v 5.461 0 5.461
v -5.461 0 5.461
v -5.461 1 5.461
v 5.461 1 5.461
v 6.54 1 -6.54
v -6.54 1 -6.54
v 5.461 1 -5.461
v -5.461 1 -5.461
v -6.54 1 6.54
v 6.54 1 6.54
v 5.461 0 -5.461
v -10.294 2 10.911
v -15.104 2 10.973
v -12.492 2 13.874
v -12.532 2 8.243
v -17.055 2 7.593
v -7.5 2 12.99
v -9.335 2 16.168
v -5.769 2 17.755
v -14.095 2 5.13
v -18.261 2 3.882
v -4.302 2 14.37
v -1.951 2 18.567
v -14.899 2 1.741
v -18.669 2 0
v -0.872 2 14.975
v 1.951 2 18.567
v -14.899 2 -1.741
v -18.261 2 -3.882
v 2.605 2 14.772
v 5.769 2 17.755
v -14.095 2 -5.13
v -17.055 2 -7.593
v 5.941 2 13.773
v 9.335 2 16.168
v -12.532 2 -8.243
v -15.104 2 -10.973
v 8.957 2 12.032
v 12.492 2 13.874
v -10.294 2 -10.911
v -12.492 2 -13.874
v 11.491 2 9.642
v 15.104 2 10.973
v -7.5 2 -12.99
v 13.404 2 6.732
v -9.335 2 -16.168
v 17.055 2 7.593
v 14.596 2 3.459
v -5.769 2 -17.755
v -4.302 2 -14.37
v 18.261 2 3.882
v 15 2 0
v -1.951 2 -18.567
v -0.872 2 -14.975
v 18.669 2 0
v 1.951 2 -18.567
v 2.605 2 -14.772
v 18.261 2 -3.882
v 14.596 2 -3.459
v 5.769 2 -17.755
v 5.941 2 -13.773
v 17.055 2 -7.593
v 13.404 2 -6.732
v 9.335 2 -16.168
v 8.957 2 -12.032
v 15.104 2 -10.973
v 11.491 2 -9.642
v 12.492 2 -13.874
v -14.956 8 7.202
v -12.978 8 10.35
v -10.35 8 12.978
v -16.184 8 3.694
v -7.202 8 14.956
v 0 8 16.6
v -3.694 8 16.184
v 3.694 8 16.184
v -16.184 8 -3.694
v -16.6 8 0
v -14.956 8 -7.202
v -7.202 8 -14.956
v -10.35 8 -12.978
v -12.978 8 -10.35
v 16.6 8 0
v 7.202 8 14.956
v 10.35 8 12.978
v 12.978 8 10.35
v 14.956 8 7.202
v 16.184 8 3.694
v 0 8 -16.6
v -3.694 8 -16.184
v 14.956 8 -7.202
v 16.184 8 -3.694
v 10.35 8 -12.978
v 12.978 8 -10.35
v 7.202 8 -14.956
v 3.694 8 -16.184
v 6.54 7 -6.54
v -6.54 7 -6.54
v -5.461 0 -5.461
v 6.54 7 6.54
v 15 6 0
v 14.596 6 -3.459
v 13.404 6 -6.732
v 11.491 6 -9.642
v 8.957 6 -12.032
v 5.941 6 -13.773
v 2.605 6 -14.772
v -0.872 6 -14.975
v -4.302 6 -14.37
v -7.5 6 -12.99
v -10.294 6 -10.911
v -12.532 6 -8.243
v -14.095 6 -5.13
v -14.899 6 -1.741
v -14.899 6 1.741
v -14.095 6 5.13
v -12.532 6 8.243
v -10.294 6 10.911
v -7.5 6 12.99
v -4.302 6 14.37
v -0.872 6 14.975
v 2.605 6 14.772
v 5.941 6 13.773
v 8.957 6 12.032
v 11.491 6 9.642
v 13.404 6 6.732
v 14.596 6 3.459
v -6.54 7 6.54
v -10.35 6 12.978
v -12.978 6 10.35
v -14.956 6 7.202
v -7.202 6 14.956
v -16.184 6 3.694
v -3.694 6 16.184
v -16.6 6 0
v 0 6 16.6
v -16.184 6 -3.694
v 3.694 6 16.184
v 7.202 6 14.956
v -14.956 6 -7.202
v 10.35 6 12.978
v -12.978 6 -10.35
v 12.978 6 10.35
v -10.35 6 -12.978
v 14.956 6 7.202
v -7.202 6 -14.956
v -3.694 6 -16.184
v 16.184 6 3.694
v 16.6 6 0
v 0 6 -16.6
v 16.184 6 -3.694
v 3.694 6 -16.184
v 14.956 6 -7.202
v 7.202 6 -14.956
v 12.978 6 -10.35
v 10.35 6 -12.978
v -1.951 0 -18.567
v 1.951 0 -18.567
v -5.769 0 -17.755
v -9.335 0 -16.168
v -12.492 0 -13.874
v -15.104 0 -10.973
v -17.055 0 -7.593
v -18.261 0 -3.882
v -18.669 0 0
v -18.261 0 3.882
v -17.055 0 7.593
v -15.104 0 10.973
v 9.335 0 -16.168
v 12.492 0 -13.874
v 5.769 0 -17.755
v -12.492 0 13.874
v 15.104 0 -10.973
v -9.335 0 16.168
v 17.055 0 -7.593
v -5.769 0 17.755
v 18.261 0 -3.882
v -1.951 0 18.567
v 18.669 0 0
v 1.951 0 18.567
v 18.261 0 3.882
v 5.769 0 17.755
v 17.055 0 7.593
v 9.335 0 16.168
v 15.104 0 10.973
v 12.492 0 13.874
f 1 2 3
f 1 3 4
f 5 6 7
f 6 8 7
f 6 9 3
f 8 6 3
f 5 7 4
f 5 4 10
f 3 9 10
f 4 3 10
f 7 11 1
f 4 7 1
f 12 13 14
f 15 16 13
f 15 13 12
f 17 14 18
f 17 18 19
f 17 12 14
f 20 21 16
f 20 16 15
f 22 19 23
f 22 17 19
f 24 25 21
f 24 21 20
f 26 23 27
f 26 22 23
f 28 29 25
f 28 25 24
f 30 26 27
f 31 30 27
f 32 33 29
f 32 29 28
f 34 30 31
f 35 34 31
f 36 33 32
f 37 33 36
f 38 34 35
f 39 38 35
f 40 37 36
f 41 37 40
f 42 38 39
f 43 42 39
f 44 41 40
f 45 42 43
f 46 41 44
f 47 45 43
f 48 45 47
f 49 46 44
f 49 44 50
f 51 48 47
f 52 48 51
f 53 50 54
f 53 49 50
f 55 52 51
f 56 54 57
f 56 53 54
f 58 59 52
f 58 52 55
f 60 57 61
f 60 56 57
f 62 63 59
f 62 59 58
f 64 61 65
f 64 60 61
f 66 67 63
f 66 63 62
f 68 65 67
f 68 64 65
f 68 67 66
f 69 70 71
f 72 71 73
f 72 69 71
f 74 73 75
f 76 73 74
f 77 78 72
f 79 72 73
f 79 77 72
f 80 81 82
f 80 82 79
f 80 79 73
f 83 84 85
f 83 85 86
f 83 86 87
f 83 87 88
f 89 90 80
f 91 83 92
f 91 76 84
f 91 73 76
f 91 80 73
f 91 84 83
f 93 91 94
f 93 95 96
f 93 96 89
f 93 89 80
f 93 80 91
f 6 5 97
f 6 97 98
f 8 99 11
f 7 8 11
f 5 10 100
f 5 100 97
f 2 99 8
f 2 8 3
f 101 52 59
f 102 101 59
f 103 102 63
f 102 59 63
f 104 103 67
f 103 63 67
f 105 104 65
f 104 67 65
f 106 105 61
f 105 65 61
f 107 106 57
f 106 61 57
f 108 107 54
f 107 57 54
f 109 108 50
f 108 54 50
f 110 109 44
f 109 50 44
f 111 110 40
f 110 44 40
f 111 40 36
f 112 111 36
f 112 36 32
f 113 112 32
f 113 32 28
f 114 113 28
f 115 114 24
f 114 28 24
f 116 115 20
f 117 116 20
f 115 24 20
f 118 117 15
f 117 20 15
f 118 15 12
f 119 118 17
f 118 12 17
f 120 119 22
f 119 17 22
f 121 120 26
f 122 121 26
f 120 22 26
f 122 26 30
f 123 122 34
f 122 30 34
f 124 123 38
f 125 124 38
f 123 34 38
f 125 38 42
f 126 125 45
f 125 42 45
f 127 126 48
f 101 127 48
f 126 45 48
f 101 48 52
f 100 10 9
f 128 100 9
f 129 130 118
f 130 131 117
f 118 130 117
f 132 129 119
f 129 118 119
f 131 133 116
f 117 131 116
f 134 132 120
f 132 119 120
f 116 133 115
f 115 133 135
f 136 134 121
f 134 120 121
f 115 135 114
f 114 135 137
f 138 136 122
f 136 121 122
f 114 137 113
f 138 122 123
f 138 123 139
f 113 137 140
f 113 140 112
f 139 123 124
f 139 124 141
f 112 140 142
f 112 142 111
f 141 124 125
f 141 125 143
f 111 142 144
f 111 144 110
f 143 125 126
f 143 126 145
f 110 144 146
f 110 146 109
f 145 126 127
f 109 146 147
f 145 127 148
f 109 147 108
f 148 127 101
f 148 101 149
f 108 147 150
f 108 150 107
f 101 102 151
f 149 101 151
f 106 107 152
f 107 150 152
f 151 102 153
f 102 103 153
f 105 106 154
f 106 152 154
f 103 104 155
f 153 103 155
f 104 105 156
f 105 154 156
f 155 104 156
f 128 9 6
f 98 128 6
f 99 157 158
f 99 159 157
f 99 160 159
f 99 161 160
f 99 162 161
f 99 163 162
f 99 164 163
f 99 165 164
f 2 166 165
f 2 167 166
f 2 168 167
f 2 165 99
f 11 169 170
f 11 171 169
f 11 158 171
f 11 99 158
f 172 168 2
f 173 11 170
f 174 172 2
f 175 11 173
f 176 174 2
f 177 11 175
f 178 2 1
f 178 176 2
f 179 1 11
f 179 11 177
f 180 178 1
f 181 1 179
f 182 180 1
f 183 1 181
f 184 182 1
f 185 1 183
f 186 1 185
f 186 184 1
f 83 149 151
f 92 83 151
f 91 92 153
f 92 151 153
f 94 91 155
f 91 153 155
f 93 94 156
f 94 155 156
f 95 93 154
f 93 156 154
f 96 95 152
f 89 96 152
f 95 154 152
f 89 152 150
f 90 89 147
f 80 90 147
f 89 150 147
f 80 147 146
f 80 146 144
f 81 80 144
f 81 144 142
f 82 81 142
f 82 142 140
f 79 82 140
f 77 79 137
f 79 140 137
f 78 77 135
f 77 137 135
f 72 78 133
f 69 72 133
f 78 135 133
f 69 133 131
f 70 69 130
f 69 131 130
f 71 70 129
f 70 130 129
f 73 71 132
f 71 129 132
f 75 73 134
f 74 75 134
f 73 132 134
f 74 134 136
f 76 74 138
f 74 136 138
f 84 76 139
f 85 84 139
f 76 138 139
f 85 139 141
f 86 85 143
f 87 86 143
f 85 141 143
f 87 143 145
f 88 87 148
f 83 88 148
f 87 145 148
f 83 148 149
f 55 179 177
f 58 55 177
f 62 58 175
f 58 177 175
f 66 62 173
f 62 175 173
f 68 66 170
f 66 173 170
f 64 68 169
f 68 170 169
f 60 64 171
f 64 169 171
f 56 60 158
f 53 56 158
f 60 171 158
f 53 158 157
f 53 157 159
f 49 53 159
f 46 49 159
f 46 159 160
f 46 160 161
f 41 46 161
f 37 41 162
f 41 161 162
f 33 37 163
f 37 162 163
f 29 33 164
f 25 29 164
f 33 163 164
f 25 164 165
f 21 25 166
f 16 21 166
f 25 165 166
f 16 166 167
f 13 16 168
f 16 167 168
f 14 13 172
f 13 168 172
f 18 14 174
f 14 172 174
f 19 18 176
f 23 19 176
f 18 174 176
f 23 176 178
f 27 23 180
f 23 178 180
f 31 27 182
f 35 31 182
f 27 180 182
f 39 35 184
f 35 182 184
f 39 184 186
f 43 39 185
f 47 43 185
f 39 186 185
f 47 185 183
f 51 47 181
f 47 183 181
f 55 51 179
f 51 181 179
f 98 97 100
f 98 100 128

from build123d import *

# Parameters (mm, degrees)
SKETCH1_R           = 18.669
BOSS_EXTRUDE1_DEPTH = 2
SKETCH2_R           = 15
BOSS_EXTRUDE2_DEPTH = 4
SKETCH3_R           = 16.6
BOSS_EXTRUDE3_DEPTH = 2
SKETCH4_W           = 13.081
SKETCH4_H           = 13.081
CUT_EXTRUDE1_DEPTH  = 7
SKETCH5_W           = 13.081
SKETCH5_H           = 13.081
SKETCH5_W_2         = 10.922
SKETCH5_H_2         = 10.922
BOSS_EXTRUDE4_DEPTH = 1


with BuildPart() as part:
    # Sketch1 → Boss-Extrude1 (new body)
    with BuildSketch(Plane(origin=(0, 0, 0), x_dir=(1, 0, 0), z_dir=(0, 1, 0))):
        Circle(SKETCH1_R)
    extrude(amount=BOSS_EXTRUDE1_DEPTH)

    # Sketch2 → Boss-Extrude2 (add)
    with BuildSketch(Plane(origin=(0, 2, 0), x_dir=(1, 0, 0), z_dir=(0, 1, 0))):
        Circle(SKETCH2_R)
    extrude(amount=BOSS_EXTRUDE2_DEPTH)

    # Sketch3 → Boss-Extrude3 (add)
    with BuildSketch(Plane(origin=(0, 6, 0), x_dir=(1, 0, 0), z_dir=(0, 1, 0))):
        Circle(SKETCH3_R)
    extrude(amount=BOSS_EXTRUDE3_DEPTH)

    # Sketch4 → Cut-Extrude1 (cut)
    with BuildSketch(Plane(origin=(0, 0, 0), x_dir=(-1, 0, 0), z_dir=(0, -1, 0))):
        Rectangle(SKETCH4_W, SKETCH4_H)
    extrude(amount=-CUT_EXTRUDE1_DEPTH, mode=Mode.SUBTRACT)

    # Sketch5 → Boss-Extrude4 (add)
    with BuildSketch(Plane.XZ):
        Rectangle(SKETCH5_W, SKETCH5_H)
        Rectangle(SKETCH5_W_2, SKETCH5_H_2, mode=Mode.SUBTRACT)
    extrude(amount=-BOSS_EXTRUDE4_DEPTH)


solid = part.part
